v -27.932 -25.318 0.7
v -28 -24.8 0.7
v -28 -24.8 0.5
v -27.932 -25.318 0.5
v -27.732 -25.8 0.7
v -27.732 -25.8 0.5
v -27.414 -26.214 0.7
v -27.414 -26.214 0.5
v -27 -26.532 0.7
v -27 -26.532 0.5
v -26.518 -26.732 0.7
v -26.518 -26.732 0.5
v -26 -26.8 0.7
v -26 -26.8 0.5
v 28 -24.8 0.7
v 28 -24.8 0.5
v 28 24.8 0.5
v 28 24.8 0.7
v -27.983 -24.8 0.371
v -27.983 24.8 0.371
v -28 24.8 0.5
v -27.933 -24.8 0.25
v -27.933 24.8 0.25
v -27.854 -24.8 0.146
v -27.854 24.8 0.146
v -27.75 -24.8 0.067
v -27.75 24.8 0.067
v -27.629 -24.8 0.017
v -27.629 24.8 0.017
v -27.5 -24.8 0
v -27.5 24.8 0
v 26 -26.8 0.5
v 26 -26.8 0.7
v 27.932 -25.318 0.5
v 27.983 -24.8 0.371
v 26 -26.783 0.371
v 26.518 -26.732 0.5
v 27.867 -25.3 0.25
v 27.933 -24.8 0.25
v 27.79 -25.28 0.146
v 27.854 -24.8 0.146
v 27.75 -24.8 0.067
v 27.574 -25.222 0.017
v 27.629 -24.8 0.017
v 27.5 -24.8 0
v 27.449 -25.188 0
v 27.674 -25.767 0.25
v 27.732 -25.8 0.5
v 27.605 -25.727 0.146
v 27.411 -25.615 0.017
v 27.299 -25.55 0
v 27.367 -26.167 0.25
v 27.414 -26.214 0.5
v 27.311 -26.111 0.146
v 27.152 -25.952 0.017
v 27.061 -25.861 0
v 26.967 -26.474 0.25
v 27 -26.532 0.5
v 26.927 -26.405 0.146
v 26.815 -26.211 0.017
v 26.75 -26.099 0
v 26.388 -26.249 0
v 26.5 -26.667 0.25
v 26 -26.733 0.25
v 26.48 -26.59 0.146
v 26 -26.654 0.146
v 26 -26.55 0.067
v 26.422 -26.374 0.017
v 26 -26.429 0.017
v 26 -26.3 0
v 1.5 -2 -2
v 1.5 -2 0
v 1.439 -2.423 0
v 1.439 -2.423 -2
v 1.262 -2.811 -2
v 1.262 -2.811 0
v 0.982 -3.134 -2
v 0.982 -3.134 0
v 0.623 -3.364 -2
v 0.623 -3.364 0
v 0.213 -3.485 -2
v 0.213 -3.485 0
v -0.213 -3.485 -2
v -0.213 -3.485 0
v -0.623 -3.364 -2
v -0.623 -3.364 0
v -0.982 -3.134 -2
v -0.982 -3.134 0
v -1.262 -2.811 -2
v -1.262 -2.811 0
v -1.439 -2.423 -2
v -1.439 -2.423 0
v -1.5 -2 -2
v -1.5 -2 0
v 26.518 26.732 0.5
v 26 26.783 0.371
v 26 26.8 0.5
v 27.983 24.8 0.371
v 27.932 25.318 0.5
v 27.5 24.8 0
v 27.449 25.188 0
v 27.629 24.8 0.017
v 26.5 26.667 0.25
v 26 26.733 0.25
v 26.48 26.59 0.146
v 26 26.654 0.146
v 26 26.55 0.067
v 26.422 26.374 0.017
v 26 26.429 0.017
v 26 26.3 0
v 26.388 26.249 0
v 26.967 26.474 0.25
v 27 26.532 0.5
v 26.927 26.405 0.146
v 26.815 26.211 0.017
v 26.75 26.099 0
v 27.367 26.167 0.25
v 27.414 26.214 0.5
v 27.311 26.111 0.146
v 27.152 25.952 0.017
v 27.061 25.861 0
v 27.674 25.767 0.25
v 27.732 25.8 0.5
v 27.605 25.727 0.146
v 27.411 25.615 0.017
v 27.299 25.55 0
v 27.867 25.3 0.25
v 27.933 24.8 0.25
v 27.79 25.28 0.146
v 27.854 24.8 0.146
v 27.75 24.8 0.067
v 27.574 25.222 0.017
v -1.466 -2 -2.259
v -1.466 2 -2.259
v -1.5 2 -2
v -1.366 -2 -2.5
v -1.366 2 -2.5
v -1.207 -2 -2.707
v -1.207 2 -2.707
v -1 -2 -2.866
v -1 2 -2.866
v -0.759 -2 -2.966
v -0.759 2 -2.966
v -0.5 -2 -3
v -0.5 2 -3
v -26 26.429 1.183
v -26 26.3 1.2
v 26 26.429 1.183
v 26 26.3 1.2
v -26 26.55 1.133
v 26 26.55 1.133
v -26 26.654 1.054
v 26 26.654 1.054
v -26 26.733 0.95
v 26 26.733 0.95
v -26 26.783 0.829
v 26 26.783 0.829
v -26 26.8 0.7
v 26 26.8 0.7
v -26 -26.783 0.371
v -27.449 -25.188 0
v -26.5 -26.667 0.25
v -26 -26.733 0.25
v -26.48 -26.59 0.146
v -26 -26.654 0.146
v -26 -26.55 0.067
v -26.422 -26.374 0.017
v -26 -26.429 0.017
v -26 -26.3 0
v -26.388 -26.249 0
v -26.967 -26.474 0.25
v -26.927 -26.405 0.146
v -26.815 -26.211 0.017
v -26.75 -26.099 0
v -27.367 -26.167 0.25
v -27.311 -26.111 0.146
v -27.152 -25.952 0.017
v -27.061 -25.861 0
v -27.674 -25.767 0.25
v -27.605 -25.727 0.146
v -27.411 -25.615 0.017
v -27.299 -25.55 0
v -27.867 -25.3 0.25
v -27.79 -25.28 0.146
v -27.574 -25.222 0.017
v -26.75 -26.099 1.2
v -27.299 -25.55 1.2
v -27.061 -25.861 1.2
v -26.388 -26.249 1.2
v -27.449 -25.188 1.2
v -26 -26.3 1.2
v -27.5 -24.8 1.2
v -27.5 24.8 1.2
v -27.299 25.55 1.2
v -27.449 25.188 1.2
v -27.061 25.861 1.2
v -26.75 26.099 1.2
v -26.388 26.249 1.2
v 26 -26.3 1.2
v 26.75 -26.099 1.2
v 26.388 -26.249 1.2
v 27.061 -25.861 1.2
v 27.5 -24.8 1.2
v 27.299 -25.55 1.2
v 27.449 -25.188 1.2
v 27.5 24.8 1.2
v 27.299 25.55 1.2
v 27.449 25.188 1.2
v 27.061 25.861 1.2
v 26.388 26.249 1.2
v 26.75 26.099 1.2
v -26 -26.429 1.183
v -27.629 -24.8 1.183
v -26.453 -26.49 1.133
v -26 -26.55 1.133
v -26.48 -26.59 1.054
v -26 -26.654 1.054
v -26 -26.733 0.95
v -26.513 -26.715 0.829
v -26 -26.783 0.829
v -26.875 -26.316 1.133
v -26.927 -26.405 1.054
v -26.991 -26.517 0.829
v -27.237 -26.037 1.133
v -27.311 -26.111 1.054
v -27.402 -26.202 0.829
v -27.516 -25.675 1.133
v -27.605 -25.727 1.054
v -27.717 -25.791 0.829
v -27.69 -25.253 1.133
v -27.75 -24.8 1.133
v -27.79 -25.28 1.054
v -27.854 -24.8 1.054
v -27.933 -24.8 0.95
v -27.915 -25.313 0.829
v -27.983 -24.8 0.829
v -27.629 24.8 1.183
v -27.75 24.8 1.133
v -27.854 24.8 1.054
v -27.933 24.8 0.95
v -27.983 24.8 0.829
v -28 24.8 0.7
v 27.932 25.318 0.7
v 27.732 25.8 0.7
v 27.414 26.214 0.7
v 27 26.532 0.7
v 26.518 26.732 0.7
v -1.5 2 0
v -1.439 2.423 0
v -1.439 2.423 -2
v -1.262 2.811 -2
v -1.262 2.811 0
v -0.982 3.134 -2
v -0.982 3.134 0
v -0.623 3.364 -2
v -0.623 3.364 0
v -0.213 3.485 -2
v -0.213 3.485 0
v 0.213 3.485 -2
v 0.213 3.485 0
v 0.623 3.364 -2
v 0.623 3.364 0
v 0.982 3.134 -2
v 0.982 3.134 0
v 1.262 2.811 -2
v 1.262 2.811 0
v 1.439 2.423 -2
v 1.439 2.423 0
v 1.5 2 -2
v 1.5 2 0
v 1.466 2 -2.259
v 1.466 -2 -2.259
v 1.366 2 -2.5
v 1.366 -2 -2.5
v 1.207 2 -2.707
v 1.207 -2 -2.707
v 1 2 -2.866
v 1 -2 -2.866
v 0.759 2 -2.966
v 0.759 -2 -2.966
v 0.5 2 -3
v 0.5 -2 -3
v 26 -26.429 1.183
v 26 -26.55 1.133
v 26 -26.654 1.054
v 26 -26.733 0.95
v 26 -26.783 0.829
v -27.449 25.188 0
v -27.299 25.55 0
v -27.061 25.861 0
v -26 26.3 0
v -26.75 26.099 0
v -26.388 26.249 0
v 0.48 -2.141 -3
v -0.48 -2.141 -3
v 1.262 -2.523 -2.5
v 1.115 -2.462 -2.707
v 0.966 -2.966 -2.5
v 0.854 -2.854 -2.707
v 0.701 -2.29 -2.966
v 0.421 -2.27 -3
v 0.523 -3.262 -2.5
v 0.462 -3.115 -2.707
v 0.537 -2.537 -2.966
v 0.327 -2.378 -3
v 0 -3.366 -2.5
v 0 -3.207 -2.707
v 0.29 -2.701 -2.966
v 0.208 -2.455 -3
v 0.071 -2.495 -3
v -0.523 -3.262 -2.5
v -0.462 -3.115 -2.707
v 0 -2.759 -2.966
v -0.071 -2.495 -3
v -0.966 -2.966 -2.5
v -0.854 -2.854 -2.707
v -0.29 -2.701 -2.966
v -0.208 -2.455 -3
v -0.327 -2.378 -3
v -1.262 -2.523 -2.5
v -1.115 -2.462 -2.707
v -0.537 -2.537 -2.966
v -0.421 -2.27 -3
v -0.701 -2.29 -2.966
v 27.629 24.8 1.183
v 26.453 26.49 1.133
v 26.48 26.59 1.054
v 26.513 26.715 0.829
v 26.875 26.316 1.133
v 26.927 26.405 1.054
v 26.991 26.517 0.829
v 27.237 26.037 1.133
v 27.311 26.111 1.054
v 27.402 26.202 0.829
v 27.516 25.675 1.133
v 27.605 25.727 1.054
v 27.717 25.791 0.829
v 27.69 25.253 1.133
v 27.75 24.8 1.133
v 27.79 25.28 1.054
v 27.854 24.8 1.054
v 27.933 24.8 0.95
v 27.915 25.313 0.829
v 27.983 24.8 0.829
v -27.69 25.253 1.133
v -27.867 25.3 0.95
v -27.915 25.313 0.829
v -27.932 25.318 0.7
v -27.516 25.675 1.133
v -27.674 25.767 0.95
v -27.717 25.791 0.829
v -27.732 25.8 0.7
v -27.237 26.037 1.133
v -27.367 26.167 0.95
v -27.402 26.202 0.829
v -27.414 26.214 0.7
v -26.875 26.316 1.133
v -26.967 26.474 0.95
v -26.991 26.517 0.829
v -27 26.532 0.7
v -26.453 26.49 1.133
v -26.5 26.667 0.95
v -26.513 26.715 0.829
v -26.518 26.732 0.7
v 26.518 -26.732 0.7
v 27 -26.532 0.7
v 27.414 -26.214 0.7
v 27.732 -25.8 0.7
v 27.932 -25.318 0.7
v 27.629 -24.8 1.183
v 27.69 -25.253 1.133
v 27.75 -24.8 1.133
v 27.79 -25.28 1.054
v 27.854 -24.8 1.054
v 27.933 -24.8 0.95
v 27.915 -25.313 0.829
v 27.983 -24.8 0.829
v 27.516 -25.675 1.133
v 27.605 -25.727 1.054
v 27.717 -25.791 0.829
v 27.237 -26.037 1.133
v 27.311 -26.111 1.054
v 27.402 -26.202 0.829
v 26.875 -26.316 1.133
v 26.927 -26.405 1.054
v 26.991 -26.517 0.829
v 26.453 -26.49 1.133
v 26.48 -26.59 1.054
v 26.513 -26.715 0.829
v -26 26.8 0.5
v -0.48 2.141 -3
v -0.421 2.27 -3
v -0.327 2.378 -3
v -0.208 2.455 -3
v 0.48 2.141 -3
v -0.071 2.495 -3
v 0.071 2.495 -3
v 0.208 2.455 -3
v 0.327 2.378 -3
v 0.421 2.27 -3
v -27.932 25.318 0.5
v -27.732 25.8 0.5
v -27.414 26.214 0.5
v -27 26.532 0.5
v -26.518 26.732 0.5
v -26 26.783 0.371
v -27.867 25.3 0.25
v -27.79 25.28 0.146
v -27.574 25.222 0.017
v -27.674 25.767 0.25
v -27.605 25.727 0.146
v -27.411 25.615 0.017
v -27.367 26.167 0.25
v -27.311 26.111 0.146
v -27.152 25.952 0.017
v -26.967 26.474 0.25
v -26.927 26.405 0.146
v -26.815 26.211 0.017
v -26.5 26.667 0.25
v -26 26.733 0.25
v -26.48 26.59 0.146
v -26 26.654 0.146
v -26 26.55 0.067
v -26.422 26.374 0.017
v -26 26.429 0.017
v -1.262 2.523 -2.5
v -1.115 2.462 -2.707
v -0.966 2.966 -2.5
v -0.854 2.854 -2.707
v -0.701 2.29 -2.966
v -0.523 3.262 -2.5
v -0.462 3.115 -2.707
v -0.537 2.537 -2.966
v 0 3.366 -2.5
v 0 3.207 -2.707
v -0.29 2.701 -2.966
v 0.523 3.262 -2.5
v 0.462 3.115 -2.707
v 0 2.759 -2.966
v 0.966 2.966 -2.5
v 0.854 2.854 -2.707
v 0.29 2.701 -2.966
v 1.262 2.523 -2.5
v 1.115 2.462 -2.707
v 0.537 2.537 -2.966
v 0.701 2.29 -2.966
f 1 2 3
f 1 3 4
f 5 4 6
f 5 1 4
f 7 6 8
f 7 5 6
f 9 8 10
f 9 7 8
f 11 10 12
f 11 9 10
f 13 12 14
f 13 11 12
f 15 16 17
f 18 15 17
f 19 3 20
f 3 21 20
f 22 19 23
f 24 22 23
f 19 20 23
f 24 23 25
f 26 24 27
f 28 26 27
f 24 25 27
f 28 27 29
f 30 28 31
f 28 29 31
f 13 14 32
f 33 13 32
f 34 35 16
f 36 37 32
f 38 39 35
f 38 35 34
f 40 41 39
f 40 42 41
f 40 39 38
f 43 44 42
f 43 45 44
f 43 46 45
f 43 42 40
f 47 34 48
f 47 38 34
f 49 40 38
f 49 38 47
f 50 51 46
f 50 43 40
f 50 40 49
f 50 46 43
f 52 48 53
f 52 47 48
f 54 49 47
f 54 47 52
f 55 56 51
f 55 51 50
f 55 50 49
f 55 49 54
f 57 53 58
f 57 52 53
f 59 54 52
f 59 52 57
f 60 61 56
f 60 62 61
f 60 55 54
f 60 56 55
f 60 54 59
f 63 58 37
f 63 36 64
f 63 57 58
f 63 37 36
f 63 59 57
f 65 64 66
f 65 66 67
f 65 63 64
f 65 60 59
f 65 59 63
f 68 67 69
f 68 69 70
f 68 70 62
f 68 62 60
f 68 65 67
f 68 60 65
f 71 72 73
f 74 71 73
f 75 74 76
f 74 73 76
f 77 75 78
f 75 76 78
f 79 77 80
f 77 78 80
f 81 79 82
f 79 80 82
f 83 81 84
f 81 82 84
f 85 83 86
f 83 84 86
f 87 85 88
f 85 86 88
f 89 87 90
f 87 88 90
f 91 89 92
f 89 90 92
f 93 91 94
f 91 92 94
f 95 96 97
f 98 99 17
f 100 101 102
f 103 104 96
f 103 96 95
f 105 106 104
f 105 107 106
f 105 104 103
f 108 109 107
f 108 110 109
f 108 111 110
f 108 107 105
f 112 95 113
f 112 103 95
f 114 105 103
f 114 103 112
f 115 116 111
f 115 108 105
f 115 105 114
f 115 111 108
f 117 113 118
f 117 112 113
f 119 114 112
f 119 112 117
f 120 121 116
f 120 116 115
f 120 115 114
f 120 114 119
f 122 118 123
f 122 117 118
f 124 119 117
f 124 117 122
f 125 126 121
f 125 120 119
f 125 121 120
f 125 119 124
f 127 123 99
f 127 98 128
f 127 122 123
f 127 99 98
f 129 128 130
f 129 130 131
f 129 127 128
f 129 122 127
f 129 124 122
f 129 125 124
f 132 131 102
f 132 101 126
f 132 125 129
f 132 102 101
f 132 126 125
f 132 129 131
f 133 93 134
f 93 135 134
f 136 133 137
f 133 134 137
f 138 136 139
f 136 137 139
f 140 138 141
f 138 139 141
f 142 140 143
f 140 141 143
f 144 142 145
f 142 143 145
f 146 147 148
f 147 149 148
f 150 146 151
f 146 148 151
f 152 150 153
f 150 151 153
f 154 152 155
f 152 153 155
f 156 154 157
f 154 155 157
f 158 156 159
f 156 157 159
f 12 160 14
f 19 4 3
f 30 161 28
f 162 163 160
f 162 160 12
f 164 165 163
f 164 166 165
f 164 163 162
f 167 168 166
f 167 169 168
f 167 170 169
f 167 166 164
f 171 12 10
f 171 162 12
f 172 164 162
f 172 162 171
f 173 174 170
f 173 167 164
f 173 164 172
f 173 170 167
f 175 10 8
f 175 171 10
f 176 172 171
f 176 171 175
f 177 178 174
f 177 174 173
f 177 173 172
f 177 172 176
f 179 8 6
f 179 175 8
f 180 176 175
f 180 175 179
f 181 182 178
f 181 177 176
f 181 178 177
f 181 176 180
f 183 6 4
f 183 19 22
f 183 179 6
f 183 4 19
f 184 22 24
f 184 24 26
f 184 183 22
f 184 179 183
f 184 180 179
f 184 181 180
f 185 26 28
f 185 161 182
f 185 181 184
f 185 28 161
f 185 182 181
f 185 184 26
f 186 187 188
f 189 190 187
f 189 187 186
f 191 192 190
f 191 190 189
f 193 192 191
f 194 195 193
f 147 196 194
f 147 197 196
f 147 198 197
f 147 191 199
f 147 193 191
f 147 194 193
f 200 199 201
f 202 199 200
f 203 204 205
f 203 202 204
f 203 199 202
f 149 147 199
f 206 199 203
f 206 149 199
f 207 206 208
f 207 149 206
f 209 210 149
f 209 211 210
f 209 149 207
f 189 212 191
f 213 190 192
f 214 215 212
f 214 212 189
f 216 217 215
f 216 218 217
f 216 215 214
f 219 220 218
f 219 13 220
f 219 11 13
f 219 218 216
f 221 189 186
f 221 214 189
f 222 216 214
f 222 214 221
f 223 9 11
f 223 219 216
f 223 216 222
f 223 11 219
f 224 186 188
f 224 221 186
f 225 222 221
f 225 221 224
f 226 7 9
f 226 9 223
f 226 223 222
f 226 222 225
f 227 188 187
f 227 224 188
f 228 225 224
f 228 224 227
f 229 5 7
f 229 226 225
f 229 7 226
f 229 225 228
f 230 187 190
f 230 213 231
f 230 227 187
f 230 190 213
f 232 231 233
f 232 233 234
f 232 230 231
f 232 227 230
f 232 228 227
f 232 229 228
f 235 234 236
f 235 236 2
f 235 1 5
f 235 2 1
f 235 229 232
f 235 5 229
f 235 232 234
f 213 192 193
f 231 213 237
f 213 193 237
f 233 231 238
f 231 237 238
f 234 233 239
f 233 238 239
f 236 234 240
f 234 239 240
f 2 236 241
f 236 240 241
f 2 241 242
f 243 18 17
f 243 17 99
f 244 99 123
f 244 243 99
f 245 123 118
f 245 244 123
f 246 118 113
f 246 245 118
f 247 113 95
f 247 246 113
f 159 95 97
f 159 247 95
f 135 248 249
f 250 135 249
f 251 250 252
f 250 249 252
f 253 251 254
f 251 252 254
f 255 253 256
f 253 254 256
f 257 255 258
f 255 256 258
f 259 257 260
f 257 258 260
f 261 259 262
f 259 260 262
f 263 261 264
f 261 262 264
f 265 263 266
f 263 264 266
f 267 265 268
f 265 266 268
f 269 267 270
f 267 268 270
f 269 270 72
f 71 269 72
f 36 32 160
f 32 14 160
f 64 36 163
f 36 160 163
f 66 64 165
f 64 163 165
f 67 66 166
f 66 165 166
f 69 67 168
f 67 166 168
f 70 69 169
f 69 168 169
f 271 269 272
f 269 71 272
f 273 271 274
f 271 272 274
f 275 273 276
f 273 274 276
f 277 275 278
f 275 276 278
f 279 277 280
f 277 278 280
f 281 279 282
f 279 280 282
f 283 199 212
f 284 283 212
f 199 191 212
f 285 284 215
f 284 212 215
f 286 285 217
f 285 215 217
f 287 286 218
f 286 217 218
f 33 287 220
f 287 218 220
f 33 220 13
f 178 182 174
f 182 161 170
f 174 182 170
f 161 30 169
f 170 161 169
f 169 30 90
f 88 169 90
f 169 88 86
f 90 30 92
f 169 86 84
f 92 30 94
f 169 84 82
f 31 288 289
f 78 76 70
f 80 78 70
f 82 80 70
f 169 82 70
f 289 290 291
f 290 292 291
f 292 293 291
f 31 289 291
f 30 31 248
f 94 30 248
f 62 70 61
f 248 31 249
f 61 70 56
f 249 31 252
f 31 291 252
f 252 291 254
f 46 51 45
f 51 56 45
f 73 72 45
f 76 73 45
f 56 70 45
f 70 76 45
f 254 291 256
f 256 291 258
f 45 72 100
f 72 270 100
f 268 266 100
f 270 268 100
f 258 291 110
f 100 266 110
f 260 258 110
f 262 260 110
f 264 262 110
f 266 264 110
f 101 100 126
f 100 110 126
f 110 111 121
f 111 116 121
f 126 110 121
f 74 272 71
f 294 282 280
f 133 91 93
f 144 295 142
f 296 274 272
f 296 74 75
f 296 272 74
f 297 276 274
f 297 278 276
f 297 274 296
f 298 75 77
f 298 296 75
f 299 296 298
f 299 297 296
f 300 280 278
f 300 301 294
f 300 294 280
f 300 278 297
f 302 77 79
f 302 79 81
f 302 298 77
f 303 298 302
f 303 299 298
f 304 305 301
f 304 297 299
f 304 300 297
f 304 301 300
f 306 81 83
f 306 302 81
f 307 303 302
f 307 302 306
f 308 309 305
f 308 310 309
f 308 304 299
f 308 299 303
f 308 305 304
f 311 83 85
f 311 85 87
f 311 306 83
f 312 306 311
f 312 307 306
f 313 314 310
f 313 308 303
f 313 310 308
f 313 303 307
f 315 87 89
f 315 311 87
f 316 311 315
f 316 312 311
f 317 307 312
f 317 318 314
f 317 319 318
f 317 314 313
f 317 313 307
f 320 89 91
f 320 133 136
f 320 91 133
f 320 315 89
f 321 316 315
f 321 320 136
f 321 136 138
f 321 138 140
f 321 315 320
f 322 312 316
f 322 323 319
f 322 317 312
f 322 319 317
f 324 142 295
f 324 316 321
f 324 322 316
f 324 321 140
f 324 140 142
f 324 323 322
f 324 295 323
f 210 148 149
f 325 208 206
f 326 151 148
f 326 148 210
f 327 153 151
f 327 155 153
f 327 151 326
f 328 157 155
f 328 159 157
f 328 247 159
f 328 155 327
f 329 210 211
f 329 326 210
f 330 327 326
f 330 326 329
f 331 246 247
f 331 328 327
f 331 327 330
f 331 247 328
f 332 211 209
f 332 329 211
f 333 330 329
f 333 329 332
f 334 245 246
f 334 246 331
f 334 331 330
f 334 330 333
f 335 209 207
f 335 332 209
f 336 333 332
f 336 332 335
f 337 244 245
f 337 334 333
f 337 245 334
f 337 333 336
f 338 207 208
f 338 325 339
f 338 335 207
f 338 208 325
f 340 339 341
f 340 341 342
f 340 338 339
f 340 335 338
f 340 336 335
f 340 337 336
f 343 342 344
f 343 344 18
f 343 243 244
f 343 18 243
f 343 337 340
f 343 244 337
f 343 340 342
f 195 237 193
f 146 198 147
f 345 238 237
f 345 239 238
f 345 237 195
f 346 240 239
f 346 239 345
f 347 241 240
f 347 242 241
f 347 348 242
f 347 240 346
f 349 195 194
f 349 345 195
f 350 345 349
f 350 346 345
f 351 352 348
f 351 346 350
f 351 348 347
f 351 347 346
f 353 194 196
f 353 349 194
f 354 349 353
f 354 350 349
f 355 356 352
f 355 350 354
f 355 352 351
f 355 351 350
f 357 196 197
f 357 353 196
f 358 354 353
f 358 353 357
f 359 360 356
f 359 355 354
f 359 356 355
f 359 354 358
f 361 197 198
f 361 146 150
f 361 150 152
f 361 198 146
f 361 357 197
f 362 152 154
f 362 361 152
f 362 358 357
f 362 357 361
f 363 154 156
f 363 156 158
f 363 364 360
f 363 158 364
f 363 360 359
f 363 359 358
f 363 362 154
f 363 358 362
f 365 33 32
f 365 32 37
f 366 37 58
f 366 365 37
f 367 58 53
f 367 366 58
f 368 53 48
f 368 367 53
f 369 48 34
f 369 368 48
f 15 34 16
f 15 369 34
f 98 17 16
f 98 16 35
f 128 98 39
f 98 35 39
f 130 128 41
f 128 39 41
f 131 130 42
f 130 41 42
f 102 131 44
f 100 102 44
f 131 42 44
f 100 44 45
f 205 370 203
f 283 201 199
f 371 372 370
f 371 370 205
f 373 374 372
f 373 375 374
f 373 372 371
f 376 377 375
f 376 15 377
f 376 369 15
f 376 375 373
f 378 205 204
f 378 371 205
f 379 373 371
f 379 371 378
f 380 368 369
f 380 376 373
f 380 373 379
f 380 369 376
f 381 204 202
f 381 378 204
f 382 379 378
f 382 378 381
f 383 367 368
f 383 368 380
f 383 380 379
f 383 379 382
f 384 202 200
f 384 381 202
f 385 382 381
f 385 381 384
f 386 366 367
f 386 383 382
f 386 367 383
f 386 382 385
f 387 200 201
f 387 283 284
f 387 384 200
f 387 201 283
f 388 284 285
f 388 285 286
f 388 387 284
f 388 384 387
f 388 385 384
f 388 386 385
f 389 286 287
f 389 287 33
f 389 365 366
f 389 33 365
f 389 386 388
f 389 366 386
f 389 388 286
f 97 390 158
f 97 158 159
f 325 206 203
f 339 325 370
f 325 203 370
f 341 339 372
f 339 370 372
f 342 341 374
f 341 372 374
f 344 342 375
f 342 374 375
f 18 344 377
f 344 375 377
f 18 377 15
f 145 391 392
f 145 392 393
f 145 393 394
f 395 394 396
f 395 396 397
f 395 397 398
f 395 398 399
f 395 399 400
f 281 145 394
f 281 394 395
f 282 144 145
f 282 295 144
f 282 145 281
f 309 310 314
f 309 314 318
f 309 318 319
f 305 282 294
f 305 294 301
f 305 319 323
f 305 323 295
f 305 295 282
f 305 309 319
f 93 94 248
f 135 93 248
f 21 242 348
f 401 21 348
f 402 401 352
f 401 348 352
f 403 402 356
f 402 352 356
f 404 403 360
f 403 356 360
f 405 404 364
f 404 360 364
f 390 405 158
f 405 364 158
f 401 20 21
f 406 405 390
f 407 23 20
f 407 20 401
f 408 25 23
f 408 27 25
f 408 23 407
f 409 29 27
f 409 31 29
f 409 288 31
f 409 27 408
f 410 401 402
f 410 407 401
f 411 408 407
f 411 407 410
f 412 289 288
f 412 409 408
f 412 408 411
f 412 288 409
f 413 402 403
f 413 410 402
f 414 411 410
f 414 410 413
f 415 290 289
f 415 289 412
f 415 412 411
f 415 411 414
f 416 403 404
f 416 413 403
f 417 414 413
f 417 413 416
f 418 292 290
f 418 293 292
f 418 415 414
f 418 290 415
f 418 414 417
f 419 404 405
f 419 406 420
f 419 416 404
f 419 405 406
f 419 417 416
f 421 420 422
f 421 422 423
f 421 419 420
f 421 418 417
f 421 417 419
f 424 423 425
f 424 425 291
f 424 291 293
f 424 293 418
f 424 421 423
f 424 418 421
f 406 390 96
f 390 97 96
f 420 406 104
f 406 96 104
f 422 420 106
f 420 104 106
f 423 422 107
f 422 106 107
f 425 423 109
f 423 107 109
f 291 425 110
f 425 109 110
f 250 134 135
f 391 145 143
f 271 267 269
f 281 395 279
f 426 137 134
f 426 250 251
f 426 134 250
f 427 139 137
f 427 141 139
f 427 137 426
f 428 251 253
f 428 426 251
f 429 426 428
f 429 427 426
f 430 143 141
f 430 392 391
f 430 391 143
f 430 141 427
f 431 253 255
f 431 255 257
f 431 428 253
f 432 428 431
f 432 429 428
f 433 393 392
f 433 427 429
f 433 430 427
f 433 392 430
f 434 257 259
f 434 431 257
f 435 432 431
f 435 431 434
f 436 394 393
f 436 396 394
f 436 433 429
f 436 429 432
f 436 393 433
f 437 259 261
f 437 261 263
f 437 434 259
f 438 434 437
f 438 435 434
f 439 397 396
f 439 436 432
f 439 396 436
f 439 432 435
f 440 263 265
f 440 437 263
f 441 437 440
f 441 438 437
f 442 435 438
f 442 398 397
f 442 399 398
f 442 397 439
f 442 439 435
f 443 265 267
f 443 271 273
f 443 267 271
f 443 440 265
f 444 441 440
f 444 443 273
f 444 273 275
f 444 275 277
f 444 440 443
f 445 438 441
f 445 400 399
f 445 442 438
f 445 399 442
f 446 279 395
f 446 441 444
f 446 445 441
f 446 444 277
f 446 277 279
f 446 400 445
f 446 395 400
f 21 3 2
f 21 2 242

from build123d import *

# Parameters (mm, degrees)
SKETCH004_W  = 56
SKETCH004_H  = 53.6
PAD002_DEPTH = 1.2
FILLET002_R  = 2
FILLET003_R  = 0.5
PAD003_DEPTH = 3
FILLET004_R  = 1


with BuildPart() as part:
    # Sketch004 → Pad002 (new body)
    with BuildSketch(Plane.XY):
        Rectangle(SKETCH004_W, SKETCH004_H)
    extrude(amount=PAD002_DEPTH)

    # Fillet002
    fillet002_edges = [part.edges().sort_by_distance(p)[0] for p in [
        (-28, -26.8, 0.6),
        (-28, 26.8, 0.6),
        (28, -26.8, 0.6),
        (28, 26.8, 0.6),
    ]]
    fillet(fillet002_edges, radius=FILLET002_R)

    # Fillet003
    fillet003_edges = [part.edges().sort_by_distance(p)[0] for p in [
        (0, 26.8, 1.2),
        (-28, 0, 0),
    ]]
    fillet(fillet003_edges, radius=FILLET003_R)

    # Sketch005 (on Face9 of Fillet003) → Pad003 (join)
    with BuildSketch(Plane(origin=(0, 0, 0), x_dir=(1, 0, 0), z_dir=(0, 0, -1))):
        with BuildLine():
            ThreePointArc((1.5, 2), (0, 3.5), (-1.5, 2))
            Line((-1.5, 2), (-1.5, -2))
            ThreePointArc((-1.5, -2), (0, -3.5), (1.5, -2))
            Line((1.5, -2), (1.5, 2))
        make_face()
    extrude(amount=PAD003_DEPTH)

    # Fillet004
    fillet004_edges = [part.edges().sort_by_distance(p)[0] for p in [
        (-1.5, 0, -3),
    ]]
    fillet(fillet004_edges, radius=FILLET004_R)


solid = part.part
